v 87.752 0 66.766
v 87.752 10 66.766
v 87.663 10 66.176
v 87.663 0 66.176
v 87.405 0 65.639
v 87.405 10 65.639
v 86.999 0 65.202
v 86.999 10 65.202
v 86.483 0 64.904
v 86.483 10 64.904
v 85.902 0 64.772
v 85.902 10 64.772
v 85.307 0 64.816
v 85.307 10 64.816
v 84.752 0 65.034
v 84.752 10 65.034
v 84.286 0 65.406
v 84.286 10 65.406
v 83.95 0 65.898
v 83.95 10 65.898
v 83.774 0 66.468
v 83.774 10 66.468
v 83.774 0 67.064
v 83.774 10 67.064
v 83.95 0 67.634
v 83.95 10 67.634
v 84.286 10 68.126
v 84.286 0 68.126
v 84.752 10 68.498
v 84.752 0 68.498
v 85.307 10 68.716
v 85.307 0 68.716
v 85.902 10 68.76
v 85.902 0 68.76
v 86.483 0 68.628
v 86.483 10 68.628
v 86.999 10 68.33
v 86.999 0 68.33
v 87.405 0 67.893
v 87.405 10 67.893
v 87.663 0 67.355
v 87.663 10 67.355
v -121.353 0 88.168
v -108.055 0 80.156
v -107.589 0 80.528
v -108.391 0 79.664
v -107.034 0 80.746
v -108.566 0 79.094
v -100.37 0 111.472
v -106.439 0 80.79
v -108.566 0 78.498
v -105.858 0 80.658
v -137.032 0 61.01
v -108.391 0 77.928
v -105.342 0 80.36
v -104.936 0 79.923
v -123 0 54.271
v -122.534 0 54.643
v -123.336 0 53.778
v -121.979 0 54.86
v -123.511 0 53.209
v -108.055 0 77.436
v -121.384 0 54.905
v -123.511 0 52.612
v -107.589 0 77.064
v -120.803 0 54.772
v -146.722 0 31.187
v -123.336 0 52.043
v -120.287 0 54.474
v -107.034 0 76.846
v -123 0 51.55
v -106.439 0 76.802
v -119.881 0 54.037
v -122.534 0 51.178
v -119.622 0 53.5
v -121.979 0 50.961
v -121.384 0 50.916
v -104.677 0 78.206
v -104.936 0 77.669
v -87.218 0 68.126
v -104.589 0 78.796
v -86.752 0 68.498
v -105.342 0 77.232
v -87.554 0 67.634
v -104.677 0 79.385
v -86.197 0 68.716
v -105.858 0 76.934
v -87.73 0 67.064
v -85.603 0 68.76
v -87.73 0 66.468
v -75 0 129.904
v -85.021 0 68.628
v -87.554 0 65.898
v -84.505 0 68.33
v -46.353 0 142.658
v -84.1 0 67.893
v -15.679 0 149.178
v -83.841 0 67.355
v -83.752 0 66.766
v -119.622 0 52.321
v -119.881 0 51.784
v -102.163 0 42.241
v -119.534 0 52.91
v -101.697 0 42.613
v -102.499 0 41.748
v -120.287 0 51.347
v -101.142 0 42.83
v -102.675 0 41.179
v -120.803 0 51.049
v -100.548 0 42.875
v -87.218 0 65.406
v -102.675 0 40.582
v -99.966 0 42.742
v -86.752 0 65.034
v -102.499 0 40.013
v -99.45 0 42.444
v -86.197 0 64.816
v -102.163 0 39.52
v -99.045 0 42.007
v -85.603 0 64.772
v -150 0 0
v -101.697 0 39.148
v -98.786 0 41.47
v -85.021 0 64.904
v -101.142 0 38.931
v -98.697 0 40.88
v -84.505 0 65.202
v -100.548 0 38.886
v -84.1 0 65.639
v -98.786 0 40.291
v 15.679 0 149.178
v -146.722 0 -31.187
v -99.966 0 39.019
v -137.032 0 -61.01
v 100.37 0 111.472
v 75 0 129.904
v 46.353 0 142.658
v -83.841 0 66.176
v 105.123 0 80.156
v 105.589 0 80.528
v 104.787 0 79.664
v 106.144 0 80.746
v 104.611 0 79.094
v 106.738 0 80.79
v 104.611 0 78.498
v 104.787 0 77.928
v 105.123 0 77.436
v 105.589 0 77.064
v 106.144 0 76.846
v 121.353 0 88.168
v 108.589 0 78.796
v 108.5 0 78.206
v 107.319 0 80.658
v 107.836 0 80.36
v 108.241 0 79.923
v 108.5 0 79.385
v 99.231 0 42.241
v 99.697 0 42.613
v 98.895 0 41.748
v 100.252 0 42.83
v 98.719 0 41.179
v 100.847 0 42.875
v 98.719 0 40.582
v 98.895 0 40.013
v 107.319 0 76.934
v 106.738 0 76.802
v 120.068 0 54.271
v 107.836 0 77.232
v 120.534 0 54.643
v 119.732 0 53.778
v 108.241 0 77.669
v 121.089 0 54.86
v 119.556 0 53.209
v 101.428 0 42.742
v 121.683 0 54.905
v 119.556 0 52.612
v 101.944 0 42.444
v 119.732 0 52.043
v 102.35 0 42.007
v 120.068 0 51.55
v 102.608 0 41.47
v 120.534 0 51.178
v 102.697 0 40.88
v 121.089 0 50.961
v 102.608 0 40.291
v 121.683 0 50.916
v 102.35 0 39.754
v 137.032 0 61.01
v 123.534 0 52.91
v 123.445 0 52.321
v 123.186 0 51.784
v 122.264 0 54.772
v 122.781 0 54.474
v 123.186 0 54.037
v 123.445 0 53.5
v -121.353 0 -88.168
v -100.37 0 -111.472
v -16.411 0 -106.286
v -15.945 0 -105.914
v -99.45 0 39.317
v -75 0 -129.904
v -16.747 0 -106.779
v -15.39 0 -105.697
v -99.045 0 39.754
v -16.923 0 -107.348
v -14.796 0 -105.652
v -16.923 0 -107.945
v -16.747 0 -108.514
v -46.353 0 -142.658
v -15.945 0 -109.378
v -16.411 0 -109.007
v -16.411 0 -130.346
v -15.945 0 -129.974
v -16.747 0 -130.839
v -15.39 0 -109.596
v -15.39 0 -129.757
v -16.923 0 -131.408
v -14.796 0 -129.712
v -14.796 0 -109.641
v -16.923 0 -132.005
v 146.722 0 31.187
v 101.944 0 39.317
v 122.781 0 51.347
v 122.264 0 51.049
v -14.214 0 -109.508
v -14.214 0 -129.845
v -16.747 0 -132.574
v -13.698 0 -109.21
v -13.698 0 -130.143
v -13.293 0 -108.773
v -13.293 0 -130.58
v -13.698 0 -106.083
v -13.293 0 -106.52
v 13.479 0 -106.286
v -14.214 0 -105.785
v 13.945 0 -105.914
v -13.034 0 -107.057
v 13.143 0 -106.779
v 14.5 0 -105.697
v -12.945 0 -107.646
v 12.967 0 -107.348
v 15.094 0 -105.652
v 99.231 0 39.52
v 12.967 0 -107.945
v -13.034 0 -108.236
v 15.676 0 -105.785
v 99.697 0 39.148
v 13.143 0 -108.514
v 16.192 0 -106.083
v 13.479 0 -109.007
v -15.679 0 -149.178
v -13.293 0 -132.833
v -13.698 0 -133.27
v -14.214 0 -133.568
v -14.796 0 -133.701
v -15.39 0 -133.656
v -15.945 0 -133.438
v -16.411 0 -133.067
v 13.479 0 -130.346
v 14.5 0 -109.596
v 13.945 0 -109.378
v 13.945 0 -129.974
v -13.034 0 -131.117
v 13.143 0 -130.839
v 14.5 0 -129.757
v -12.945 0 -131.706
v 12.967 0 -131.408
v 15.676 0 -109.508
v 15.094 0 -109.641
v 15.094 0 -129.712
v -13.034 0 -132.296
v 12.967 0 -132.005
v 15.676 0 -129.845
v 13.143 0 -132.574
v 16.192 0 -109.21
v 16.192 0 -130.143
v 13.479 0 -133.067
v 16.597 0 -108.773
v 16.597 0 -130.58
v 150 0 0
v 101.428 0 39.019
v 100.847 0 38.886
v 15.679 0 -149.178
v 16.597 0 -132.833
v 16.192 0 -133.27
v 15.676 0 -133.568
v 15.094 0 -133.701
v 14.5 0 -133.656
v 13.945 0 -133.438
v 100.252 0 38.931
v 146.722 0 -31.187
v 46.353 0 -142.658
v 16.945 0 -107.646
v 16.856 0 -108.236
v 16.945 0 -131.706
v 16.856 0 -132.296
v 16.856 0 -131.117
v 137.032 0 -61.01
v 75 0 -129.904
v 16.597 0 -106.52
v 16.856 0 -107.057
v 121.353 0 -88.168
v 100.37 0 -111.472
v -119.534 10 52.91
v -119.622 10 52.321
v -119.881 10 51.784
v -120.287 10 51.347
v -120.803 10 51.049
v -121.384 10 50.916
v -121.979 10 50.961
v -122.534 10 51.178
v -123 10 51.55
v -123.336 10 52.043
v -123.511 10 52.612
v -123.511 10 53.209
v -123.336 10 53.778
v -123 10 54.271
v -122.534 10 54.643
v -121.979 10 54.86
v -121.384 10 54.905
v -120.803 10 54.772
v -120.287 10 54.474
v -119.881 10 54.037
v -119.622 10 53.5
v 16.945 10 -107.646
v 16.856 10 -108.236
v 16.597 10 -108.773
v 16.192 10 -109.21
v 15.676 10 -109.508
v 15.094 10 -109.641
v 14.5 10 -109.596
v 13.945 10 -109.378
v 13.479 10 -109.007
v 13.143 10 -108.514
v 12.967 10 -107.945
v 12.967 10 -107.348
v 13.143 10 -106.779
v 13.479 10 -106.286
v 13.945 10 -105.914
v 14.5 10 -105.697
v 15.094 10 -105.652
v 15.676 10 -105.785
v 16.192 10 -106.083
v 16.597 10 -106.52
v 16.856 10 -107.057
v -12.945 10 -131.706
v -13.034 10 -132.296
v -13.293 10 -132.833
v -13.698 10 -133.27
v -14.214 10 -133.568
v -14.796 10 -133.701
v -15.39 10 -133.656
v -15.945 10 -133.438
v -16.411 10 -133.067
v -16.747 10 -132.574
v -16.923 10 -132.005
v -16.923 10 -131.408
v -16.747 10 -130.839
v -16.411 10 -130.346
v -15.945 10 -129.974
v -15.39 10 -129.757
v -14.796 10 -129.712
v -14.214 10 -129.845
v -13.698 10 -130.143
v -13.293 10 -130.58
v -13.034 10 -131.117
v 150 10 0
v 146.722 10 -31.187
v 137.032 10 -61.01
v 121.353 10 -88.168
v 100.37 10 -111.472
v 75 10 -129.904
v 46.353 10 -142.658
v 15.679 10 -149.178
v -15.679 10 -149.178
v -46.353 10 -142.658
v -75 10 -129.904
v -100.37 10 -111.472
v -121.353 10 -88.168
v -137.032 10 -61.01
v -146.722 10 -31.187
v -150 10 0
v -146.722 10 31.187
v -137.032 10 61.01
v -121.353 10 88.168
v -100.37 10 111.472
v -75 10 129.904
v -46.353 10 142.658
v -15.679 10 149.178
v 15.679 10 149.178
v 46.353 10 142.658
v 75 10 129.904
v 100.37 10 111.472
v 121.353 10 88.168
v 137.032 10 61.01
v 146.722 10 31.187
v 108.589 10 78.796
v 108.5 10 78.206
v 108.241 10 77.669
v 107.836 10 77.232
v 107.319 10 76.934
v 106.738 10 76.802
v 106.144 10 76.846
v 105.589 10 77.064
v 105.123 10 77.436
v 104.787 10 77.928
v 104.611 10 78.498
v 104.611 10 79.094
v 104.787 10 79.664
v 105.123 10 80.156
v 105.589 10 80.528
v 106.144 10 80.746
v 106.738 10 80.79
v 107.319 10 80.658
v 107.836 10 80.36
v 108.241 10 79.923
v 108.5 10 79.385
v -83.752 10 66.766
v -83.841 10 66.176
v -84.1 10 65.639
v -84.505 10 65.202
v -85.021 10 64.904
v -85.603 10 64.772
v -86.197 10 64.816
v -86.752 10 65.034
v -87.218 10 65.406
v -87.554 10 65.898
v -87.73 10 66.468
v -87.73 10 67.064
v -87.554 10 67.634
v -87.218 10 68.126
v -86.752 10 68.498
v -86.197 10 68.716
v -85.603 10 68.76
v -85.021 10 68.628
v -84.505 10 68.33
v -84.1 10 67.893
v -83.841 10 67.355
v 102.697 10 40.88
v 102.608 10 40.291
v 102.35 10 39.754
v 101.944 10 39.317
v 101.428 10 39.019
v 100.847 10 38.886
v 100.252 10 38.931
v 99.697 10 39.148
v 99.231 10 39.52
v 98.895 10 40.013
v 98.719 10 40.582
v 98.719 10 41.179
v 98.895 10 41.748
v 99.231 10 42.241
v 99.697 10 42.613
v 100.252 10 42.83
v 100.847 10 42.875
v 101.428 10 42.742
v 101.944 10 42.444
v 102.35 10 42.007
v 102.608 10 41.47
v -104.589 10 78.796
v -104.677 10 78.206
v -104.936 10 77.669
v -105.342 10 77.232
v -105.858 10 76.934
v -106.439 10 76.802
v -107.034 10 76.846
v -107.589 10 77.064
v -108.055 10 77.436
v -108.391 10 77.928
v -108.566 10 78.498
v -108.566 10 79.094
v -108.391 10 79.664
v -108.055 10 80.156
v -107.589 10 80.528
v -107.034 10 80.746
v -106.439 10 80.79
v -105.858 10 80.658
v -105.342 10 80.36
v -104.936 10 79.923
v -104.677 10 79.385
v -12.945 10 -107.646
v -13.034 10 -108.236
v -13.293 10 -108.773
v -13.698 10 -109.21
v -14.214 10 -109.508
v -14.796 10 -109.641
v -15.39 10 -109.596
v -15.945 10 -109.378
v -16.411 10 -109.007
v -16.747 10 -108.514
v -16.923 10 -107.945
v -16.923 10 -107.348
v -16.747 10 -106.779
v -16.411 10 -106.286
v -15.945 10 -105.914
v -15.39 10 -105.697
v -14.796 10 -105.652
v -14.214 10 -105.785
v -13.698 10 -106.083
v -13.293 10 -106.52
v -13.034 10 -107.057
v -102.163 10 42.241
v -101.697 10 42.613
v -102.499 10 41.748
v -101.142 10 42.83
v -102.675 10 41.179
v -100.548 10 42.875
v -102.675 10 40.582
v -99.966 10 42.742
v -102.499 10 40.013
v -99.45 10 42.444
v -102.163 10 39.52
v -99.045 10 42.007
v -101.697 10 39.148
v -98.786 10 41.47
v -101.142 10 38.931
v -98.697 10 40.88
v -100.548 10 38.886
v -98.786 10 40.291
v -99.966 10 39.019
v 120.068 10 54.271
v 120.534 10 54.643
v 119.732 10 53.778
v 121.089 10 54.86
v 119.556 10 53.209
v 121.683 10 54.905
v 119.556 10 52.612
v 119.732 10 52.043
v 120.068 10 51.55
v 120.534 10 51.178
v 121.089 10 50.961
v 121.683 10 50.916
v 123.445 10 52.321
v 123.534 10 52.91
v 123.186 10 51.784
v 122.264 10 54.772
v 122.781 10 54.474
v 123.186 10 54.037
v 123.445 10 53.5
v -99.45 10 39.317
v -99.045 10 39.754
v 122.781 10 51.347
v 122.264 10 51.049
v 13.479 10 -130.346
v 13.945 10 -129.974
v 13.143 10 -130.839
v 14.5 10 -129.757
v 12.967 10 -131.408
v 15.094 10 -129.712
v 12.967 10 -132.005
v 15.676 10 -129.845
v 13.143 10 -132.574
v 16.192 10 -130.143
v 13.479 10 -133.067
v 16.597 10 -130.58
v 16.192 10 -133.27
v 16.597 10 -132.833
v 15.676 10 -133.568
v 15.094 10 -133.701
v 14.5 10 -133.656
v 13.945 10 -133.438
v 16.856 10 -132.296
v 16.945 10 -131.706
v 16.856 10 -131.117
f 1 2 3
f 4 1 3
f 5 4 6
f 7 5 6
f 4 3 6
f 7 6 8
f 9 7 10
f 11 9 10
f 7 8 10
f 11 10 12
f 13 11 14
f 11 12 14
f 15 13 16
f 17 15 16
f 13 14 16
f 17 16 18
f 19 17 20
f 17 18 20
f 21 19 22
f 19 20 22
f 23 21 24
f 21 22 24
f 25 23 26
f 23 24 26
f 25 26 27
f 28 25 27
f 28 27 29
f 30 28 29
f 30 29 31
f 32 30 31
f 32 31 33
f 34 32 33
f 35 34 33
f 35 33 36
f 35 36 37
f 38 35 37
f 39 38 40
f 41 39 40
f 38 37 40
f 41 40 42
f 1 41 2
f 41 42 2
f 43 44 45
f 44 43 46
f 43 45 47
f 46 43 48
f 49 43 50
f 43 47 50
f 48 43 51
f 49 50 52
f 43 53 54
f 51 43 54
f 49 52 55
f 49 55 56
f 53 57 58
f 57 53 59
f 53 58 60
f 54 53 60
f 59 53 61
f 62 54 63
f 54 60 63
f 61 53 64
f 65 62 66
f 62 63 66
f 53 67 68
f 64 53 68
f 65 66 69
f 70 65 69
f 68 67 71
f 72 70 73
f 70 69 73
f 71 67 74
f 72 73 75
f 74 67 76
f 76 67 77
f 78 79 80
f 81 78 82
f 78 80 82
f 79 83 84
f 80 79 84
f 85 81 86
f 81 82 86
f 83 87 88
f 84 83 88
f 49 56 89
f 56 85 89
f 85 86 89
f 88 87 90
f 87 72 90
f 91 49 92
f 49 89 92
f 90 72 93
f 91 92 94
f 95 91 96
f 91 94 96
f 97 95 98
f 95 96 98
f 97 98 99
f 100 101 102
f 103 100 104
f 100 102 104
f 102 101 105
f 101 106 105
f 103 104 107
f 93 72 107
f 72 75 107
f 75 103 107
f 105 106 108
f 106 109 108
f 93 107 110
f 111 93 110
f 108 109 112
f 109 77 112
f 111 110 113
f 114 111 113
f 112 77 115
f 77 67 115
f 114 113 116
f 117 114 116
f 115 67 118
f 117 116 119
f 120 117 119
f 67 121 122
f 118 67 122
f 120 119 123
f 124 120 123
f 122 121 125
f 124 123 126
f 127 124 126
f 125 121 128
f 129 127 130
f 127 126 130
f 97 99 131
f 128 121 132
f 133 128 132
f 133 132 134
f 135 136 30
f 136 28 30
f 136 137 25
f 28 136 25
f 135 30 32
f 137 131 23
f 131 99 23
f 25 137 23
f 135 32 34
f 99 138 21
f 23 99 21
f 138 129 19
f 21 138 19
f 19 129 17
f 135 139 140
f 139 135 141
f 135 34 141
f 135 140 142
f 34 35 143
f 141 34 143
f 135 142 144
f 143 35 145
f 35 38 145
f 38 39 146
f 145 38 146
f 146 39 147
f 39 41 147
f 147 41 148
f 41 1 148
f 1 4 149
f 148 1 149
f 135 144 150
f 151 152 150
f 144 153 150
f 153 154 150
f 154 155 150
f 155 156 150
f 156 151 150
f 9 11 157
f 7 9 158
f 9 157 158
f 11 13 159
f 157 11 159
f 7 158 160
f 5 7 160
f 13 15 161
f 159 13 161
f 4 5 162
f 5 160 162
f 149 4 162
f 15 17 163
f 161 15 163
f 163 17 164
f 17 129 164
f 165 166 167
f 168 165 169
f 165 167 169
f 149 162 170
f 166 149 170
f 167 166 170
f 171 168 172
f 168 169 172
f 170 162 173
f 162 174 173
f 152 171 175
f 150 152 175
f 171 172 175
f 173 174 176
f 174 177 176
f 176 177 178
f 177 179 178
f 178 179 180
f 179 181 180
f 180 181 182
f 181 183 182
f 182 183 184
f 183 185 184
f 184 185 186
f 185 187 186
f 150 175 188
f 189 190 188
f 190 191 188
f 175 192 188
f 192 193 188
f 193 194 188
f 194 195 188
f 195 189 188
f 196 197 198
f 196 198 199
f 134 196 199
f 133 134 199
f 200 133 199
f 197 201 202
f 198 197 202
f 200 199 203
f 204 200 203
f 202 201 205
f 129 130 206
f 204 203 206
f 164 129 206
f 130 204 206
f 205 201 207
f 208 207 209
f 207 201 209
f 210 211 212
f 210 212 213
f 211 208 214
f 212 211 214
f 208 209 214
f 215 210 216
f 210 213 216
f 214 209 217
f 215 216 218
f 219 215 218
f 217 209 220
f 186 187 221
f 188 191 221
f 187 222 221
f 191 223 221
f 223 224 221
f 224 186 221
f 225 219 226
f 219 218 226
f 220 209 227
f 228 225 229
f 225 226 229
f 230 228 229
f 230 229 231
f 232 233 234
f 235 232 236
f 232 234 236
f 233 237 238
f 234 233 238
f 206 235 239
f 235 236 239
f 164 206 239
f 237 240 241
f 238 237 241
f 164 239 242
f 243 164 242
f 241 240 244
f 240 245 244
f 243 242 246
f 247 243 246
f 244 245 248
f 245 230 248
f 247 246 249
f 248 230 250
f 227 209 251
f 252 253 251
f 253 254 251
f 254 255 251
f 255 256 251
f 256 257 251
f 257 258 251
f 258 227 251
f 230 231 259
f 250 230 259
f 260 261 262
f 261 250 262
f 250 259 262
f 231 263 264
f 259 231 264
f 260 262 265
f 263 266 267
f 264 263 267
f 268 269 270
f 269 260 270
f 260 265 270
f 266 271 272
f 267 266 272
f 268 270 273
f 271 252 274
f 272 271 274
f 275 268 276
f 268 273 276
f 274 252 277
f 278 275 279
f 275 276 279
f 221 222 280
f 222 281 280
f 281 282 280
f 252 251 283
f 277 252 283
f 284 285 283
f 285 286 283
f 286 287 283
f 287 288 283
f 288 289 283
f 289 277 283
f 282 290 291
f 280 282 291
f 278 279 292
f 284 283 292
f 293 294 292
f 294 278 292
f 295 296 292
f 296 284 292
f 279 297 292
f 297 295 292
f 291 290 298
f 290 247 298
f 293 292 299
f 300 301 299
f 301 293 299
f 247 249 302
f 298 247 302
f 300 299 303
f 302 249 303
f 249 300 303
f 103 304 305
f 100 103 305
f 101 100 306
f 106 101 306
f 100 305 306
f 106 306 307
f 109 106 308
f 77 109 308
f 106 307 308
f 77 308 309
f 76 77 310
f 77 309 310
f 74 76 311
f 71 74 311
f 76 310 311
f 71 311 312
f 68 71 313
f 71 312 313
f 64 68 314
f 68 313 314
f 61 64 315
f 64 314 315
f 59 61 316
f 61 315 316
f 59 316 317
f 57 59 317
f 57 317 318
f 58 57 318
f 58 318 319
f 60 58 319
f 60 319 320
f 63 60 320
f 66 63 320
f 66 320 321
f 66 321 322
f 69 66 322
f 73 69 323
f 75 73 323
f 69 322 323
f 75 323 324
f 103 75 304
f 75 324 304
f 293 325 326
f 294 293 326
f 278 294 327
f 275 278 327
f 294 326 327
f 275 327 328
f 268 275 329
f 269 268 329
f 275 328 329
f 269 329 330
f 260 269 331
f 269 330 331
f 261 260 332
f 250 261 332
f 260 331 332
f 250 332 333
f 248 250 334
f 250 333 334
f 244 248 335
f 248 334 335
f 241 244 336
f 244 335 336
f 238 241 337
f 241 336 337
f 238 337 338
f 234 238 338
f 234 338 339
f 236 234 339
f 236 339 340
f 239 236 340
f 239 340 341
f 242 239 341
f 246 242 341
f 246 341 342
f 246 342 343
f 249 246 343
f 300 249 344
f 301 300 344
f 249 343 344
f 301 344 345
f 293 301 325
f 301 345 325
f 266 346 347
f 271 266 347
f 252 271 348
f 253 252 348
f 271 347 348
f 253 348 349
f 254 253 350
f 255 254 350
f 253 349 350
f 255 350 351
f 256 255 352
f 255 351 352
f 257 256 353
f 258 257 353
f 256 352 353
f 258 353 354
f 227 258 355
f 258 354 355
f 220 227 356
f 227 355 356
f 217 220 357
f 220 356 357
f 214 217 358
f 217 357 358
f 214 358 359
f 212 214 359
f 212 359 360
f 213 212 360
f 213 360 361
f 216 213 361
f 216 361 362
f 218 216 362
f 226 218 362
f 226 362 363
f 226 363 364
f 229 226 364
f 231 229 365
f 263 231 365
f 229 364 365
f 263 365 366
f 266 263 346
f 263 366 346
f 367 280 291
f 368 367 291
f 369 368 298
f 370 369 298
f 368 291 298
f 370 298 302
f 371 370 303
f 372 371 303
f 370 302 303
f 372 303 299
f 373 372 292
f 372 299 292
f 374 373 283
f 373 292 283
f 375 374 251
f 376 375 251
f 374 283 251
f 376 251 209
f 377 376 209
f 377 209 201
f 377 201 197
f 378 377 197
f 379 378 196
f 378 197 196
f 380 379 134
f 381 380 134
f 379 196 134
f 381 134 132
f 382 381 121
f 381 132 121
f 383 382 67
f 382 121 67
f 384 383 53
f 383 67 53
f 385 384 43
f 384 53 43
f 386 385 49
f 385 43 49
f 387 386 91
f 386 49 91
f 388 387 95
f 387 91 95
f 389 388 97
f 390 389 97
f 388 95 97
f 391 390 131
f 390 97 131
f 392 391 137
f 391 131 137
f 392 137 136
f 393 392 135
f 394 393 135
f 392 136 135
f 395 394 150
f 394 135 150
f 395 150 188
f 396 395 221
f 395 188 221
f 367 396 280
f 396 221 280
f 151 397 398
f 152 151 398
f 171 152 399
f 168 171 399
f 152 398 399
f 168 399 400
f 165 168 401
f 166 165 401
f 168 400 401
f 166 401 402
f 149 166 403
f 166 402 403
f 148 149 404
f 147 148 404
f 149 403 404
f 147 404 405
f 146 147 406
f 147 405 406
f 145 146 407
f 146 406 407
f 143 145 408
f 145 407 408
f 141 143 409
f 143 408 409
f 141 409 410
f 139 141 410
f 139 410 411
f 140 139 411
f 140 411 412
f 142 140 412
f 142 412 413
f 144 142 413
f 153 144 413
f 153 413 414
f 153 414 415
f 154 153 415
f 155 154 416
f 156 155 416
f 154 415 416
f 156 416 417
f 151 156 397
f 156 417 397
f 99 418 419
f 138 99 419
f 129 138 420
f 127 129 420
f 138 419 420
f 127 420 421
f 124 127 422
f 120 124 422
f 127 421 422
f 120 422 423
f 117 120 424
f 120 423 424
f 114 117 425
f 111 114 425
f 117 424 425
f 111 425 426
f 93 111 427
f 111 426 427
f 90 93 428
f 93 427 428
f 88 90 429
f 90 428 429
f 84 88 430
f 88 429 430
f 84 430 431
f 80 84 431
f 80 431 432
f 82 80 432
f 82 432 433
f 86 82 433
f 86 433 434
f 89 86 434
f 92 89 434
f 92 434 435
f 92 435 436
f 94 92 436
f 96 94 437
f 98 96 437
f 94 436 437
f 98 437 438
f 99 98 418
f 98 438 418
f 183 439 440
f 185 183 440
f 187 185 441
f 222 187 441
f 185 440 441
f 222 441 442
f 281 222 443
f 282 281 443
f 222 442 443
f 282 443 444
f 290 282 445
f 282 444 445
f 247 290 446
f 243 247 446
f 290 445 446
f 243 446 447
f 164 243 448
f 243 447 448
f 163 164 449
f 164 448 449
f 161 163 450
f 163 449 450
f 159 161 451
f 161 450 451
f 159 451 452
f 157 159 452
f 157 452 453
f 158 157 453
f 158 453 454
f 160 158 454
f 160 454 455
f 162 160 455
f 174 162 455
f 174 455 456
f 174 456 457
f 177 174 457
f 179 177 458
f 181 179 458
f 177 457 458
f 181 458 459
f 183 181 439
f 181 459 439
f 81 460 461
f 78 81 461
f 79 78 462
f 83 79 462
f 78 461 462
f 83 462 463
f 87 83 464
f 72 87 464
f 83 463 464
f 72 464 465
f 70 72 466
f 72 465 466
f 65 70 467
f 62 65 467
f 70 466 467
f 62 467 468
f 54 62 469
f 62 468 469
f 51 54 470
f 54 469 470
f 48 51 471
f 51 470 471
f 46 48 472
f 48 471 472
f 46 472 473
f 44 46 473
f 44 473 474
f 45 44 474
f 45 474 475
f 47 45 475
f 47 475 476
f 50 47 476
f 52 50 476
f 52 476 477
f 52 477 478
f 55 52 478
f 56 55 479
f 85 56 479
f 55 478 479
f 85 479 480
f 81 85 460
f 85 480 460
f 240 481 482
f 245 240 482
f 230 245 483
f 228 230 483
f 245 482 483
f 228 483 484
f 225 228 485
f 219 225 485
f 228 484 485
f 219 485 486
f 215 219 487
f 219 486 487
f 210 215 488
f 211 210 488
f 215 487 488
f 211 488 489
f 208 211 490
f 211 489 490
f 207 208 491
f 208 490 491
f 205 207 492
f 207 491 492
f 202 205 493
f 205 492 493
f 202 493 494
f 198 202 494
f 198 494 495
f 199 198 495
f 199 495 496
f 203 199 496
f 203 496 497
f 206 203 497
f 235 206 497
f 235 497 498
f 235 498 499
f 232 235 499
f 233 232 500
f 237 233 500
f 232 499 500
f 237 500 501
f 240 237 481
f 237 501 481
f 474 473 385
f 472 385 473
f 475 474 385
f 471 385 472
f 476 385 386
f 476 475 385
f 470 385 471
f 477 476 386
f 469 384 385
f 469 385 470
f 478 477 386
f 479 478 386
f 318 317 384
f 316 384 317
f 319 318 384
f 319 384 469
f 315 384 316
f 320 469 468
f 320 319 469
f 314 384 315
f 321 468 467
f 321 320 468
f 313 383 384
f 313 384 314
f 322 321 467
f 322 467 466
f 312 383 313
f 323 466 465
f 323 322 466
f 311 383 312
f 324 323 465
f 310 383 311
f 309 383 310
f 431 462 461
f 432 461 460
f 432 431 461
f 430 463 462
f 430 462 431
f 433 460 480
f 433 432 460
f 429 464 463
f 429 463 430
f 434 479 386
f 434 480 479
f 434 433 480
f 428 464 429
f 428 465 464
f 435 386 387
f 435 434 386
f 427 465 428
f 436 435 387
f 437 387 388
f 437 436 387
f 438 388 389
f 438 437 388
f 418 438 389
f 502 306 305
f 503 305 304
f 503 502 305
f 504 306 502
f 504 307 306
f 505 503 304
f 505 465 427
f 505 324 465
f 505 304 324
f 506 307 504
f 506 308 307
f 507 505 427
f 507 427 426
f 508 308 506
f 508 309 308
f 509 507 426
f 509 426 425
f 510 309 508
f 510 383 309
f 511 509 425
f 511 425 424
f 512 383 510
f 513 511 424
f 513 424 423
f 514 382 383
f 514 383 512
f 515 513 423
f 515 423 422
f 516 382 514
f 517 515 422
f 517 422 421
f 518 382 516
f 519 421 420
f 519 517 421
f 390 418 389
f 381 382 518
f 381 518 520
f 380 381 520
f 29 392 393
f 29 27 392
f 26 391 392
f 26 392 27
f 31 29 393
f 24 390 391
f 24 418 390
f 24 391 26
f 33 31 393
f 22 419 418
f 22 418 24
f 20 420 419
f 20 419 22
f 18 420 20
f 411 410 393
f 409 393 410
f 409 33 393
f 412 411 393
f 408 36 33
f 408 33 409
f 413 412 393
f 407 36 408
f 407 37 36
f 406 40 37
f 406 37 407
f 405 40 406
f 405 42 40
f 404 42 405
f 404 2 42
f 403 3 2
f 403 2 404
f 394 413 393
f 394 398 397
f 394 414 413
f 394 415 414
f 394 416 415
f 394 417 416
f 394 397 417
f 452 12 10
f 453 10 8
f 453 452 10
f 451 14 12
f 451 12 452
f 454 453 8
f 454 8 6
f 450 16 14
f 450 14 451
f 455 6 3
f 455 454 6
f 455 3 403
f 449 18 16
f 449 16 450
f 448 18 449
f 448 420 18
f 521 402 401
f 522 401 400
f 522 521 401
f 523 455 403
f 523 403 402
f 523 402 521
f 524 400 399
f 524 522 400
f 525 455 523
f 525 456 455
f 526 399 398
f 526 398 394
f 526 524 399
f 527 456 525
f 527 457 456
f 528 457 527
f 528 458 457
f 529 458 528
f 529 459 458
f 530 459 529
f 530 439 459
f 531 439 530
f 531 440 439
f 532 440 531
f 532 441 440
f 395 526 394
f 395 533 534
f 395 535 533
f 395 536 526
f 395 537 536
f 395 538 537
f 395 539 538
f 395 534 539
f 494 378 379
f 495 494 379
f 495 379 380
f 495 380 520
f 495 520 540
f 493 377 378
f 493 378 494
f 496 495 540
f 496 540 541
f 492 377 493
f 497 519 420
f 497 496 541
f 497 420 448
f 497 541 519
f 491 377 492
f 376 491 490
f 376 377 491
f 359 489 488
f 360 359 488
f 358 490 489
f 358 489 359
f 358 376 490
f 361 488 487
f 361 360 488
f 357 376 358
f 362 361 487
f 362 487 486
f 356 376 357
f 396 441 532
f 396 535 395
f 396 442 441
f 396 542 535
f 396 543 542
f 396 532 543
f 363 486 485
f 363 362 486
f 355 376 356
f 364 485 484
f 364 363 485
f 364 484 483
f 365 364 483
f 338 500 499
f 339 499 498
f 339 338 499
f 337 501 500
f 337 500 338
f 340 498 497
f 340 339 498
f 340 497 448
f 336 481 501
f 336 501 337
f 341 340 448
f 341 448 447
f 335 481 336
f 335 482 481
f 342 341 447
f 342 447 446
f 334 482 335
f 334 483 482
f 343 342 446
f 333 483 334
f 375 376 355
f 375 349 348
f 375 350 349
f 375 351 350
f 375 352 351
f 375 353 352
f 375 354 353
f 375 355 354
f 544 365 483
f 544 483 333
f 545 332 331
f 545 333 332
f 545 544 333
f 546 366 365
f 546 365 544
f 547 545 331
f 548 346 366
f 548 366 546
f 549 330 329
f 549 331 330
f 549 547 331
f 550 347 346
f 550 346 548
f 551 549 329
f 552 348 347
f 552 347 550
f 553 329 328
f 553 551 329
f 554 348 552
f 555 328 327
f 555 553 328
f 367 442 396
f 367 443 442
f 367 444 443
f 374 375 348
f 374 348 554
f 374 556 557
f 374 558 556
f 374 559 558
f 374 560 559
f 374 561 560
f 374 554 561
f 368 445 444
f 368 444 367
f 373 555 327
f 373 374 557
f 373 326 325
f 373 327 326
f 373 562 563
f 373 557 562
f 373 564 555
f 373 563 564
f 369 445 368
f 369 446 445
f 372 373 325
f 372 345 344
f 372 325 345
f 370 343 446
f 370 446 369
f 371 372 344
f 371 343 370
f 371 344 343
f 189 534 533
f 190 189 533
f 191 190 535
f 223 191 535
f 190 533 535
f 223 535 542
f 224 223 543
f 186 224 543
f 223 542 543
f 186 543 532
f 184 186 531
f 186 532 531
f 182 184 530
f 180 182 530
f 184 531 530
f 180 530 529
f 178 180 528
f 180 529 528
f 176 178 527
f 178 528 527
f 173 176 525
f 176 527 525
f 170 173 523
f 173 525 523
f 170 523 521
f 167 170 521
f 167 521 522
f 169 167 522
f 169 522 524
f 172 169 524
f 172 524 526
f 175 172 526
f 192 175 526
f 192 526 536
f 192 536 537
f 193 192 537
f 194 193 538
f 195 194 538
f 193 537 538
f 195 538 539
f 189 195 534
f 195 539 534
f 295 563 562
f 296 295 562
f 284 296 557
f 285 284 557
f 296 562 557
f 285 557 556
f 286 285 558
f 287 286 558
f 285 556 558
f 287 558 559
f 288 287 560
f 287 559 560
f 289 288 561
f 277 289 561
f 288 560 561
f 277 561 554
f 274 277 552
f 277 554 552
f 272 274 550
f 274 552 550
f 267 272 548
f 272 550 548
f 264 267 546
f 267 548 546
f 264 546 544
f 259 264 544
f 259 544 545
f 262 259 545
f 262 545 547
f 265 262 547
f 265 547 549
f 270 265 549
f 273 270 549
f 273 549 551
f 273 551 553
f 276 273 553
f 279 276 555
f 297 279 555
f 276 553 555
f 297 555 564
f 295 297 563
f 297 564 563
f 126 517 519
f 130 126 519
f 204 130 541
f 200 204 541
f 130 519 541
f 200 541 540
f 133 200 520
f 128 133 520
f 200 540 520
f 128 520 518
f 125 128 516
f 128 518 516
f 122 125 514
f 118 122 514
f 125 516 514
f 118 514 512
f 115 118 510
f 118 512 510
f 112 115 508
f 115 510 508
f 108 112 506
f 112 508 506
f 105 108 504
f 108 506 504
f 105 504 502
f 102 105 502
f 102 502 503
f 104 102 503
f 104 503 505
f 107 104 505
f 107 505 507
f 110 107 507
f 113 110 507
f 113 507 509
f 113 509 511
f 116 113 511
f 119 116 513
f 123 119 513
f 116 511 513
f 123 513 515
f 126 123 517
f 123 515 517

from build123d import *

# Parameters (mm, degrees)
SKETCH1_R           = 150
BOSS_EXTRUDE1_DEPTH = 10
SKETCH2_R           = 2
CUT_EXTRUDE1_DEPTH  = 10


with BuildPart() as part:
    # Sketch1 → Boss-Extrude1 (new body)
    with BuildSketch(Plane(origin=(0, 0, 0), x_dir=(1, 0, 0), z_dir=(0, 1, 0))):
        Circle(SKETCH1_R)
    extrude(amount=BOSS_EXTRUDE1_DEPTH)

    # Sketch2 → Cut-Extrude1 (cut)
    with BuildSketch(Plane(origin=(0, 10, 0), x_dir=(1, 0, 0), z_dir=(0, 1, 0))):
        with Locations((-14.945, 131.706442493)):
            Circle(SKETCH2_R)
        with Locations((-14.945, 107.646442493)):
            Circle(SKETCH2_R)
        with Locations((14.945, 107.646442493)):
            Circle(SKETCH2_R)
        with Locations((14.945, 131.706442493)):
            Circle(SKETCH2_R)
        with Locations((85.752053826, -66.765970906)):
            Circle(SKETCH2_R)
        with Locations((100.697053826, -40.880471587)):
            Circle(SKETCH2_R)
        with Locations((106.588625041, -78.795970906)):
            Circle(SKETCH2_R)
        with Locations((121.533625041, -52.910471587)):
            Circle(SKETCH2_R)
        with Locations((-100.697053826, -40.880471587)):
            Circle(SKETCH2_R)
        with Locations((-85.752053826, -66.765970906)):
            Circle(SKETCH2_R)
        with Locations((-121.533625041, -52.910471587)):
            Circle(SKETCH2_R)
        with Locations((-106.588625041, -78.795970906)):
            Circle(SKETCH2_R)
    extrude(amount=-CUT_EXTRUDE1_DEPTH, mode=Mode.SUBTRACT)


solid = part.part
